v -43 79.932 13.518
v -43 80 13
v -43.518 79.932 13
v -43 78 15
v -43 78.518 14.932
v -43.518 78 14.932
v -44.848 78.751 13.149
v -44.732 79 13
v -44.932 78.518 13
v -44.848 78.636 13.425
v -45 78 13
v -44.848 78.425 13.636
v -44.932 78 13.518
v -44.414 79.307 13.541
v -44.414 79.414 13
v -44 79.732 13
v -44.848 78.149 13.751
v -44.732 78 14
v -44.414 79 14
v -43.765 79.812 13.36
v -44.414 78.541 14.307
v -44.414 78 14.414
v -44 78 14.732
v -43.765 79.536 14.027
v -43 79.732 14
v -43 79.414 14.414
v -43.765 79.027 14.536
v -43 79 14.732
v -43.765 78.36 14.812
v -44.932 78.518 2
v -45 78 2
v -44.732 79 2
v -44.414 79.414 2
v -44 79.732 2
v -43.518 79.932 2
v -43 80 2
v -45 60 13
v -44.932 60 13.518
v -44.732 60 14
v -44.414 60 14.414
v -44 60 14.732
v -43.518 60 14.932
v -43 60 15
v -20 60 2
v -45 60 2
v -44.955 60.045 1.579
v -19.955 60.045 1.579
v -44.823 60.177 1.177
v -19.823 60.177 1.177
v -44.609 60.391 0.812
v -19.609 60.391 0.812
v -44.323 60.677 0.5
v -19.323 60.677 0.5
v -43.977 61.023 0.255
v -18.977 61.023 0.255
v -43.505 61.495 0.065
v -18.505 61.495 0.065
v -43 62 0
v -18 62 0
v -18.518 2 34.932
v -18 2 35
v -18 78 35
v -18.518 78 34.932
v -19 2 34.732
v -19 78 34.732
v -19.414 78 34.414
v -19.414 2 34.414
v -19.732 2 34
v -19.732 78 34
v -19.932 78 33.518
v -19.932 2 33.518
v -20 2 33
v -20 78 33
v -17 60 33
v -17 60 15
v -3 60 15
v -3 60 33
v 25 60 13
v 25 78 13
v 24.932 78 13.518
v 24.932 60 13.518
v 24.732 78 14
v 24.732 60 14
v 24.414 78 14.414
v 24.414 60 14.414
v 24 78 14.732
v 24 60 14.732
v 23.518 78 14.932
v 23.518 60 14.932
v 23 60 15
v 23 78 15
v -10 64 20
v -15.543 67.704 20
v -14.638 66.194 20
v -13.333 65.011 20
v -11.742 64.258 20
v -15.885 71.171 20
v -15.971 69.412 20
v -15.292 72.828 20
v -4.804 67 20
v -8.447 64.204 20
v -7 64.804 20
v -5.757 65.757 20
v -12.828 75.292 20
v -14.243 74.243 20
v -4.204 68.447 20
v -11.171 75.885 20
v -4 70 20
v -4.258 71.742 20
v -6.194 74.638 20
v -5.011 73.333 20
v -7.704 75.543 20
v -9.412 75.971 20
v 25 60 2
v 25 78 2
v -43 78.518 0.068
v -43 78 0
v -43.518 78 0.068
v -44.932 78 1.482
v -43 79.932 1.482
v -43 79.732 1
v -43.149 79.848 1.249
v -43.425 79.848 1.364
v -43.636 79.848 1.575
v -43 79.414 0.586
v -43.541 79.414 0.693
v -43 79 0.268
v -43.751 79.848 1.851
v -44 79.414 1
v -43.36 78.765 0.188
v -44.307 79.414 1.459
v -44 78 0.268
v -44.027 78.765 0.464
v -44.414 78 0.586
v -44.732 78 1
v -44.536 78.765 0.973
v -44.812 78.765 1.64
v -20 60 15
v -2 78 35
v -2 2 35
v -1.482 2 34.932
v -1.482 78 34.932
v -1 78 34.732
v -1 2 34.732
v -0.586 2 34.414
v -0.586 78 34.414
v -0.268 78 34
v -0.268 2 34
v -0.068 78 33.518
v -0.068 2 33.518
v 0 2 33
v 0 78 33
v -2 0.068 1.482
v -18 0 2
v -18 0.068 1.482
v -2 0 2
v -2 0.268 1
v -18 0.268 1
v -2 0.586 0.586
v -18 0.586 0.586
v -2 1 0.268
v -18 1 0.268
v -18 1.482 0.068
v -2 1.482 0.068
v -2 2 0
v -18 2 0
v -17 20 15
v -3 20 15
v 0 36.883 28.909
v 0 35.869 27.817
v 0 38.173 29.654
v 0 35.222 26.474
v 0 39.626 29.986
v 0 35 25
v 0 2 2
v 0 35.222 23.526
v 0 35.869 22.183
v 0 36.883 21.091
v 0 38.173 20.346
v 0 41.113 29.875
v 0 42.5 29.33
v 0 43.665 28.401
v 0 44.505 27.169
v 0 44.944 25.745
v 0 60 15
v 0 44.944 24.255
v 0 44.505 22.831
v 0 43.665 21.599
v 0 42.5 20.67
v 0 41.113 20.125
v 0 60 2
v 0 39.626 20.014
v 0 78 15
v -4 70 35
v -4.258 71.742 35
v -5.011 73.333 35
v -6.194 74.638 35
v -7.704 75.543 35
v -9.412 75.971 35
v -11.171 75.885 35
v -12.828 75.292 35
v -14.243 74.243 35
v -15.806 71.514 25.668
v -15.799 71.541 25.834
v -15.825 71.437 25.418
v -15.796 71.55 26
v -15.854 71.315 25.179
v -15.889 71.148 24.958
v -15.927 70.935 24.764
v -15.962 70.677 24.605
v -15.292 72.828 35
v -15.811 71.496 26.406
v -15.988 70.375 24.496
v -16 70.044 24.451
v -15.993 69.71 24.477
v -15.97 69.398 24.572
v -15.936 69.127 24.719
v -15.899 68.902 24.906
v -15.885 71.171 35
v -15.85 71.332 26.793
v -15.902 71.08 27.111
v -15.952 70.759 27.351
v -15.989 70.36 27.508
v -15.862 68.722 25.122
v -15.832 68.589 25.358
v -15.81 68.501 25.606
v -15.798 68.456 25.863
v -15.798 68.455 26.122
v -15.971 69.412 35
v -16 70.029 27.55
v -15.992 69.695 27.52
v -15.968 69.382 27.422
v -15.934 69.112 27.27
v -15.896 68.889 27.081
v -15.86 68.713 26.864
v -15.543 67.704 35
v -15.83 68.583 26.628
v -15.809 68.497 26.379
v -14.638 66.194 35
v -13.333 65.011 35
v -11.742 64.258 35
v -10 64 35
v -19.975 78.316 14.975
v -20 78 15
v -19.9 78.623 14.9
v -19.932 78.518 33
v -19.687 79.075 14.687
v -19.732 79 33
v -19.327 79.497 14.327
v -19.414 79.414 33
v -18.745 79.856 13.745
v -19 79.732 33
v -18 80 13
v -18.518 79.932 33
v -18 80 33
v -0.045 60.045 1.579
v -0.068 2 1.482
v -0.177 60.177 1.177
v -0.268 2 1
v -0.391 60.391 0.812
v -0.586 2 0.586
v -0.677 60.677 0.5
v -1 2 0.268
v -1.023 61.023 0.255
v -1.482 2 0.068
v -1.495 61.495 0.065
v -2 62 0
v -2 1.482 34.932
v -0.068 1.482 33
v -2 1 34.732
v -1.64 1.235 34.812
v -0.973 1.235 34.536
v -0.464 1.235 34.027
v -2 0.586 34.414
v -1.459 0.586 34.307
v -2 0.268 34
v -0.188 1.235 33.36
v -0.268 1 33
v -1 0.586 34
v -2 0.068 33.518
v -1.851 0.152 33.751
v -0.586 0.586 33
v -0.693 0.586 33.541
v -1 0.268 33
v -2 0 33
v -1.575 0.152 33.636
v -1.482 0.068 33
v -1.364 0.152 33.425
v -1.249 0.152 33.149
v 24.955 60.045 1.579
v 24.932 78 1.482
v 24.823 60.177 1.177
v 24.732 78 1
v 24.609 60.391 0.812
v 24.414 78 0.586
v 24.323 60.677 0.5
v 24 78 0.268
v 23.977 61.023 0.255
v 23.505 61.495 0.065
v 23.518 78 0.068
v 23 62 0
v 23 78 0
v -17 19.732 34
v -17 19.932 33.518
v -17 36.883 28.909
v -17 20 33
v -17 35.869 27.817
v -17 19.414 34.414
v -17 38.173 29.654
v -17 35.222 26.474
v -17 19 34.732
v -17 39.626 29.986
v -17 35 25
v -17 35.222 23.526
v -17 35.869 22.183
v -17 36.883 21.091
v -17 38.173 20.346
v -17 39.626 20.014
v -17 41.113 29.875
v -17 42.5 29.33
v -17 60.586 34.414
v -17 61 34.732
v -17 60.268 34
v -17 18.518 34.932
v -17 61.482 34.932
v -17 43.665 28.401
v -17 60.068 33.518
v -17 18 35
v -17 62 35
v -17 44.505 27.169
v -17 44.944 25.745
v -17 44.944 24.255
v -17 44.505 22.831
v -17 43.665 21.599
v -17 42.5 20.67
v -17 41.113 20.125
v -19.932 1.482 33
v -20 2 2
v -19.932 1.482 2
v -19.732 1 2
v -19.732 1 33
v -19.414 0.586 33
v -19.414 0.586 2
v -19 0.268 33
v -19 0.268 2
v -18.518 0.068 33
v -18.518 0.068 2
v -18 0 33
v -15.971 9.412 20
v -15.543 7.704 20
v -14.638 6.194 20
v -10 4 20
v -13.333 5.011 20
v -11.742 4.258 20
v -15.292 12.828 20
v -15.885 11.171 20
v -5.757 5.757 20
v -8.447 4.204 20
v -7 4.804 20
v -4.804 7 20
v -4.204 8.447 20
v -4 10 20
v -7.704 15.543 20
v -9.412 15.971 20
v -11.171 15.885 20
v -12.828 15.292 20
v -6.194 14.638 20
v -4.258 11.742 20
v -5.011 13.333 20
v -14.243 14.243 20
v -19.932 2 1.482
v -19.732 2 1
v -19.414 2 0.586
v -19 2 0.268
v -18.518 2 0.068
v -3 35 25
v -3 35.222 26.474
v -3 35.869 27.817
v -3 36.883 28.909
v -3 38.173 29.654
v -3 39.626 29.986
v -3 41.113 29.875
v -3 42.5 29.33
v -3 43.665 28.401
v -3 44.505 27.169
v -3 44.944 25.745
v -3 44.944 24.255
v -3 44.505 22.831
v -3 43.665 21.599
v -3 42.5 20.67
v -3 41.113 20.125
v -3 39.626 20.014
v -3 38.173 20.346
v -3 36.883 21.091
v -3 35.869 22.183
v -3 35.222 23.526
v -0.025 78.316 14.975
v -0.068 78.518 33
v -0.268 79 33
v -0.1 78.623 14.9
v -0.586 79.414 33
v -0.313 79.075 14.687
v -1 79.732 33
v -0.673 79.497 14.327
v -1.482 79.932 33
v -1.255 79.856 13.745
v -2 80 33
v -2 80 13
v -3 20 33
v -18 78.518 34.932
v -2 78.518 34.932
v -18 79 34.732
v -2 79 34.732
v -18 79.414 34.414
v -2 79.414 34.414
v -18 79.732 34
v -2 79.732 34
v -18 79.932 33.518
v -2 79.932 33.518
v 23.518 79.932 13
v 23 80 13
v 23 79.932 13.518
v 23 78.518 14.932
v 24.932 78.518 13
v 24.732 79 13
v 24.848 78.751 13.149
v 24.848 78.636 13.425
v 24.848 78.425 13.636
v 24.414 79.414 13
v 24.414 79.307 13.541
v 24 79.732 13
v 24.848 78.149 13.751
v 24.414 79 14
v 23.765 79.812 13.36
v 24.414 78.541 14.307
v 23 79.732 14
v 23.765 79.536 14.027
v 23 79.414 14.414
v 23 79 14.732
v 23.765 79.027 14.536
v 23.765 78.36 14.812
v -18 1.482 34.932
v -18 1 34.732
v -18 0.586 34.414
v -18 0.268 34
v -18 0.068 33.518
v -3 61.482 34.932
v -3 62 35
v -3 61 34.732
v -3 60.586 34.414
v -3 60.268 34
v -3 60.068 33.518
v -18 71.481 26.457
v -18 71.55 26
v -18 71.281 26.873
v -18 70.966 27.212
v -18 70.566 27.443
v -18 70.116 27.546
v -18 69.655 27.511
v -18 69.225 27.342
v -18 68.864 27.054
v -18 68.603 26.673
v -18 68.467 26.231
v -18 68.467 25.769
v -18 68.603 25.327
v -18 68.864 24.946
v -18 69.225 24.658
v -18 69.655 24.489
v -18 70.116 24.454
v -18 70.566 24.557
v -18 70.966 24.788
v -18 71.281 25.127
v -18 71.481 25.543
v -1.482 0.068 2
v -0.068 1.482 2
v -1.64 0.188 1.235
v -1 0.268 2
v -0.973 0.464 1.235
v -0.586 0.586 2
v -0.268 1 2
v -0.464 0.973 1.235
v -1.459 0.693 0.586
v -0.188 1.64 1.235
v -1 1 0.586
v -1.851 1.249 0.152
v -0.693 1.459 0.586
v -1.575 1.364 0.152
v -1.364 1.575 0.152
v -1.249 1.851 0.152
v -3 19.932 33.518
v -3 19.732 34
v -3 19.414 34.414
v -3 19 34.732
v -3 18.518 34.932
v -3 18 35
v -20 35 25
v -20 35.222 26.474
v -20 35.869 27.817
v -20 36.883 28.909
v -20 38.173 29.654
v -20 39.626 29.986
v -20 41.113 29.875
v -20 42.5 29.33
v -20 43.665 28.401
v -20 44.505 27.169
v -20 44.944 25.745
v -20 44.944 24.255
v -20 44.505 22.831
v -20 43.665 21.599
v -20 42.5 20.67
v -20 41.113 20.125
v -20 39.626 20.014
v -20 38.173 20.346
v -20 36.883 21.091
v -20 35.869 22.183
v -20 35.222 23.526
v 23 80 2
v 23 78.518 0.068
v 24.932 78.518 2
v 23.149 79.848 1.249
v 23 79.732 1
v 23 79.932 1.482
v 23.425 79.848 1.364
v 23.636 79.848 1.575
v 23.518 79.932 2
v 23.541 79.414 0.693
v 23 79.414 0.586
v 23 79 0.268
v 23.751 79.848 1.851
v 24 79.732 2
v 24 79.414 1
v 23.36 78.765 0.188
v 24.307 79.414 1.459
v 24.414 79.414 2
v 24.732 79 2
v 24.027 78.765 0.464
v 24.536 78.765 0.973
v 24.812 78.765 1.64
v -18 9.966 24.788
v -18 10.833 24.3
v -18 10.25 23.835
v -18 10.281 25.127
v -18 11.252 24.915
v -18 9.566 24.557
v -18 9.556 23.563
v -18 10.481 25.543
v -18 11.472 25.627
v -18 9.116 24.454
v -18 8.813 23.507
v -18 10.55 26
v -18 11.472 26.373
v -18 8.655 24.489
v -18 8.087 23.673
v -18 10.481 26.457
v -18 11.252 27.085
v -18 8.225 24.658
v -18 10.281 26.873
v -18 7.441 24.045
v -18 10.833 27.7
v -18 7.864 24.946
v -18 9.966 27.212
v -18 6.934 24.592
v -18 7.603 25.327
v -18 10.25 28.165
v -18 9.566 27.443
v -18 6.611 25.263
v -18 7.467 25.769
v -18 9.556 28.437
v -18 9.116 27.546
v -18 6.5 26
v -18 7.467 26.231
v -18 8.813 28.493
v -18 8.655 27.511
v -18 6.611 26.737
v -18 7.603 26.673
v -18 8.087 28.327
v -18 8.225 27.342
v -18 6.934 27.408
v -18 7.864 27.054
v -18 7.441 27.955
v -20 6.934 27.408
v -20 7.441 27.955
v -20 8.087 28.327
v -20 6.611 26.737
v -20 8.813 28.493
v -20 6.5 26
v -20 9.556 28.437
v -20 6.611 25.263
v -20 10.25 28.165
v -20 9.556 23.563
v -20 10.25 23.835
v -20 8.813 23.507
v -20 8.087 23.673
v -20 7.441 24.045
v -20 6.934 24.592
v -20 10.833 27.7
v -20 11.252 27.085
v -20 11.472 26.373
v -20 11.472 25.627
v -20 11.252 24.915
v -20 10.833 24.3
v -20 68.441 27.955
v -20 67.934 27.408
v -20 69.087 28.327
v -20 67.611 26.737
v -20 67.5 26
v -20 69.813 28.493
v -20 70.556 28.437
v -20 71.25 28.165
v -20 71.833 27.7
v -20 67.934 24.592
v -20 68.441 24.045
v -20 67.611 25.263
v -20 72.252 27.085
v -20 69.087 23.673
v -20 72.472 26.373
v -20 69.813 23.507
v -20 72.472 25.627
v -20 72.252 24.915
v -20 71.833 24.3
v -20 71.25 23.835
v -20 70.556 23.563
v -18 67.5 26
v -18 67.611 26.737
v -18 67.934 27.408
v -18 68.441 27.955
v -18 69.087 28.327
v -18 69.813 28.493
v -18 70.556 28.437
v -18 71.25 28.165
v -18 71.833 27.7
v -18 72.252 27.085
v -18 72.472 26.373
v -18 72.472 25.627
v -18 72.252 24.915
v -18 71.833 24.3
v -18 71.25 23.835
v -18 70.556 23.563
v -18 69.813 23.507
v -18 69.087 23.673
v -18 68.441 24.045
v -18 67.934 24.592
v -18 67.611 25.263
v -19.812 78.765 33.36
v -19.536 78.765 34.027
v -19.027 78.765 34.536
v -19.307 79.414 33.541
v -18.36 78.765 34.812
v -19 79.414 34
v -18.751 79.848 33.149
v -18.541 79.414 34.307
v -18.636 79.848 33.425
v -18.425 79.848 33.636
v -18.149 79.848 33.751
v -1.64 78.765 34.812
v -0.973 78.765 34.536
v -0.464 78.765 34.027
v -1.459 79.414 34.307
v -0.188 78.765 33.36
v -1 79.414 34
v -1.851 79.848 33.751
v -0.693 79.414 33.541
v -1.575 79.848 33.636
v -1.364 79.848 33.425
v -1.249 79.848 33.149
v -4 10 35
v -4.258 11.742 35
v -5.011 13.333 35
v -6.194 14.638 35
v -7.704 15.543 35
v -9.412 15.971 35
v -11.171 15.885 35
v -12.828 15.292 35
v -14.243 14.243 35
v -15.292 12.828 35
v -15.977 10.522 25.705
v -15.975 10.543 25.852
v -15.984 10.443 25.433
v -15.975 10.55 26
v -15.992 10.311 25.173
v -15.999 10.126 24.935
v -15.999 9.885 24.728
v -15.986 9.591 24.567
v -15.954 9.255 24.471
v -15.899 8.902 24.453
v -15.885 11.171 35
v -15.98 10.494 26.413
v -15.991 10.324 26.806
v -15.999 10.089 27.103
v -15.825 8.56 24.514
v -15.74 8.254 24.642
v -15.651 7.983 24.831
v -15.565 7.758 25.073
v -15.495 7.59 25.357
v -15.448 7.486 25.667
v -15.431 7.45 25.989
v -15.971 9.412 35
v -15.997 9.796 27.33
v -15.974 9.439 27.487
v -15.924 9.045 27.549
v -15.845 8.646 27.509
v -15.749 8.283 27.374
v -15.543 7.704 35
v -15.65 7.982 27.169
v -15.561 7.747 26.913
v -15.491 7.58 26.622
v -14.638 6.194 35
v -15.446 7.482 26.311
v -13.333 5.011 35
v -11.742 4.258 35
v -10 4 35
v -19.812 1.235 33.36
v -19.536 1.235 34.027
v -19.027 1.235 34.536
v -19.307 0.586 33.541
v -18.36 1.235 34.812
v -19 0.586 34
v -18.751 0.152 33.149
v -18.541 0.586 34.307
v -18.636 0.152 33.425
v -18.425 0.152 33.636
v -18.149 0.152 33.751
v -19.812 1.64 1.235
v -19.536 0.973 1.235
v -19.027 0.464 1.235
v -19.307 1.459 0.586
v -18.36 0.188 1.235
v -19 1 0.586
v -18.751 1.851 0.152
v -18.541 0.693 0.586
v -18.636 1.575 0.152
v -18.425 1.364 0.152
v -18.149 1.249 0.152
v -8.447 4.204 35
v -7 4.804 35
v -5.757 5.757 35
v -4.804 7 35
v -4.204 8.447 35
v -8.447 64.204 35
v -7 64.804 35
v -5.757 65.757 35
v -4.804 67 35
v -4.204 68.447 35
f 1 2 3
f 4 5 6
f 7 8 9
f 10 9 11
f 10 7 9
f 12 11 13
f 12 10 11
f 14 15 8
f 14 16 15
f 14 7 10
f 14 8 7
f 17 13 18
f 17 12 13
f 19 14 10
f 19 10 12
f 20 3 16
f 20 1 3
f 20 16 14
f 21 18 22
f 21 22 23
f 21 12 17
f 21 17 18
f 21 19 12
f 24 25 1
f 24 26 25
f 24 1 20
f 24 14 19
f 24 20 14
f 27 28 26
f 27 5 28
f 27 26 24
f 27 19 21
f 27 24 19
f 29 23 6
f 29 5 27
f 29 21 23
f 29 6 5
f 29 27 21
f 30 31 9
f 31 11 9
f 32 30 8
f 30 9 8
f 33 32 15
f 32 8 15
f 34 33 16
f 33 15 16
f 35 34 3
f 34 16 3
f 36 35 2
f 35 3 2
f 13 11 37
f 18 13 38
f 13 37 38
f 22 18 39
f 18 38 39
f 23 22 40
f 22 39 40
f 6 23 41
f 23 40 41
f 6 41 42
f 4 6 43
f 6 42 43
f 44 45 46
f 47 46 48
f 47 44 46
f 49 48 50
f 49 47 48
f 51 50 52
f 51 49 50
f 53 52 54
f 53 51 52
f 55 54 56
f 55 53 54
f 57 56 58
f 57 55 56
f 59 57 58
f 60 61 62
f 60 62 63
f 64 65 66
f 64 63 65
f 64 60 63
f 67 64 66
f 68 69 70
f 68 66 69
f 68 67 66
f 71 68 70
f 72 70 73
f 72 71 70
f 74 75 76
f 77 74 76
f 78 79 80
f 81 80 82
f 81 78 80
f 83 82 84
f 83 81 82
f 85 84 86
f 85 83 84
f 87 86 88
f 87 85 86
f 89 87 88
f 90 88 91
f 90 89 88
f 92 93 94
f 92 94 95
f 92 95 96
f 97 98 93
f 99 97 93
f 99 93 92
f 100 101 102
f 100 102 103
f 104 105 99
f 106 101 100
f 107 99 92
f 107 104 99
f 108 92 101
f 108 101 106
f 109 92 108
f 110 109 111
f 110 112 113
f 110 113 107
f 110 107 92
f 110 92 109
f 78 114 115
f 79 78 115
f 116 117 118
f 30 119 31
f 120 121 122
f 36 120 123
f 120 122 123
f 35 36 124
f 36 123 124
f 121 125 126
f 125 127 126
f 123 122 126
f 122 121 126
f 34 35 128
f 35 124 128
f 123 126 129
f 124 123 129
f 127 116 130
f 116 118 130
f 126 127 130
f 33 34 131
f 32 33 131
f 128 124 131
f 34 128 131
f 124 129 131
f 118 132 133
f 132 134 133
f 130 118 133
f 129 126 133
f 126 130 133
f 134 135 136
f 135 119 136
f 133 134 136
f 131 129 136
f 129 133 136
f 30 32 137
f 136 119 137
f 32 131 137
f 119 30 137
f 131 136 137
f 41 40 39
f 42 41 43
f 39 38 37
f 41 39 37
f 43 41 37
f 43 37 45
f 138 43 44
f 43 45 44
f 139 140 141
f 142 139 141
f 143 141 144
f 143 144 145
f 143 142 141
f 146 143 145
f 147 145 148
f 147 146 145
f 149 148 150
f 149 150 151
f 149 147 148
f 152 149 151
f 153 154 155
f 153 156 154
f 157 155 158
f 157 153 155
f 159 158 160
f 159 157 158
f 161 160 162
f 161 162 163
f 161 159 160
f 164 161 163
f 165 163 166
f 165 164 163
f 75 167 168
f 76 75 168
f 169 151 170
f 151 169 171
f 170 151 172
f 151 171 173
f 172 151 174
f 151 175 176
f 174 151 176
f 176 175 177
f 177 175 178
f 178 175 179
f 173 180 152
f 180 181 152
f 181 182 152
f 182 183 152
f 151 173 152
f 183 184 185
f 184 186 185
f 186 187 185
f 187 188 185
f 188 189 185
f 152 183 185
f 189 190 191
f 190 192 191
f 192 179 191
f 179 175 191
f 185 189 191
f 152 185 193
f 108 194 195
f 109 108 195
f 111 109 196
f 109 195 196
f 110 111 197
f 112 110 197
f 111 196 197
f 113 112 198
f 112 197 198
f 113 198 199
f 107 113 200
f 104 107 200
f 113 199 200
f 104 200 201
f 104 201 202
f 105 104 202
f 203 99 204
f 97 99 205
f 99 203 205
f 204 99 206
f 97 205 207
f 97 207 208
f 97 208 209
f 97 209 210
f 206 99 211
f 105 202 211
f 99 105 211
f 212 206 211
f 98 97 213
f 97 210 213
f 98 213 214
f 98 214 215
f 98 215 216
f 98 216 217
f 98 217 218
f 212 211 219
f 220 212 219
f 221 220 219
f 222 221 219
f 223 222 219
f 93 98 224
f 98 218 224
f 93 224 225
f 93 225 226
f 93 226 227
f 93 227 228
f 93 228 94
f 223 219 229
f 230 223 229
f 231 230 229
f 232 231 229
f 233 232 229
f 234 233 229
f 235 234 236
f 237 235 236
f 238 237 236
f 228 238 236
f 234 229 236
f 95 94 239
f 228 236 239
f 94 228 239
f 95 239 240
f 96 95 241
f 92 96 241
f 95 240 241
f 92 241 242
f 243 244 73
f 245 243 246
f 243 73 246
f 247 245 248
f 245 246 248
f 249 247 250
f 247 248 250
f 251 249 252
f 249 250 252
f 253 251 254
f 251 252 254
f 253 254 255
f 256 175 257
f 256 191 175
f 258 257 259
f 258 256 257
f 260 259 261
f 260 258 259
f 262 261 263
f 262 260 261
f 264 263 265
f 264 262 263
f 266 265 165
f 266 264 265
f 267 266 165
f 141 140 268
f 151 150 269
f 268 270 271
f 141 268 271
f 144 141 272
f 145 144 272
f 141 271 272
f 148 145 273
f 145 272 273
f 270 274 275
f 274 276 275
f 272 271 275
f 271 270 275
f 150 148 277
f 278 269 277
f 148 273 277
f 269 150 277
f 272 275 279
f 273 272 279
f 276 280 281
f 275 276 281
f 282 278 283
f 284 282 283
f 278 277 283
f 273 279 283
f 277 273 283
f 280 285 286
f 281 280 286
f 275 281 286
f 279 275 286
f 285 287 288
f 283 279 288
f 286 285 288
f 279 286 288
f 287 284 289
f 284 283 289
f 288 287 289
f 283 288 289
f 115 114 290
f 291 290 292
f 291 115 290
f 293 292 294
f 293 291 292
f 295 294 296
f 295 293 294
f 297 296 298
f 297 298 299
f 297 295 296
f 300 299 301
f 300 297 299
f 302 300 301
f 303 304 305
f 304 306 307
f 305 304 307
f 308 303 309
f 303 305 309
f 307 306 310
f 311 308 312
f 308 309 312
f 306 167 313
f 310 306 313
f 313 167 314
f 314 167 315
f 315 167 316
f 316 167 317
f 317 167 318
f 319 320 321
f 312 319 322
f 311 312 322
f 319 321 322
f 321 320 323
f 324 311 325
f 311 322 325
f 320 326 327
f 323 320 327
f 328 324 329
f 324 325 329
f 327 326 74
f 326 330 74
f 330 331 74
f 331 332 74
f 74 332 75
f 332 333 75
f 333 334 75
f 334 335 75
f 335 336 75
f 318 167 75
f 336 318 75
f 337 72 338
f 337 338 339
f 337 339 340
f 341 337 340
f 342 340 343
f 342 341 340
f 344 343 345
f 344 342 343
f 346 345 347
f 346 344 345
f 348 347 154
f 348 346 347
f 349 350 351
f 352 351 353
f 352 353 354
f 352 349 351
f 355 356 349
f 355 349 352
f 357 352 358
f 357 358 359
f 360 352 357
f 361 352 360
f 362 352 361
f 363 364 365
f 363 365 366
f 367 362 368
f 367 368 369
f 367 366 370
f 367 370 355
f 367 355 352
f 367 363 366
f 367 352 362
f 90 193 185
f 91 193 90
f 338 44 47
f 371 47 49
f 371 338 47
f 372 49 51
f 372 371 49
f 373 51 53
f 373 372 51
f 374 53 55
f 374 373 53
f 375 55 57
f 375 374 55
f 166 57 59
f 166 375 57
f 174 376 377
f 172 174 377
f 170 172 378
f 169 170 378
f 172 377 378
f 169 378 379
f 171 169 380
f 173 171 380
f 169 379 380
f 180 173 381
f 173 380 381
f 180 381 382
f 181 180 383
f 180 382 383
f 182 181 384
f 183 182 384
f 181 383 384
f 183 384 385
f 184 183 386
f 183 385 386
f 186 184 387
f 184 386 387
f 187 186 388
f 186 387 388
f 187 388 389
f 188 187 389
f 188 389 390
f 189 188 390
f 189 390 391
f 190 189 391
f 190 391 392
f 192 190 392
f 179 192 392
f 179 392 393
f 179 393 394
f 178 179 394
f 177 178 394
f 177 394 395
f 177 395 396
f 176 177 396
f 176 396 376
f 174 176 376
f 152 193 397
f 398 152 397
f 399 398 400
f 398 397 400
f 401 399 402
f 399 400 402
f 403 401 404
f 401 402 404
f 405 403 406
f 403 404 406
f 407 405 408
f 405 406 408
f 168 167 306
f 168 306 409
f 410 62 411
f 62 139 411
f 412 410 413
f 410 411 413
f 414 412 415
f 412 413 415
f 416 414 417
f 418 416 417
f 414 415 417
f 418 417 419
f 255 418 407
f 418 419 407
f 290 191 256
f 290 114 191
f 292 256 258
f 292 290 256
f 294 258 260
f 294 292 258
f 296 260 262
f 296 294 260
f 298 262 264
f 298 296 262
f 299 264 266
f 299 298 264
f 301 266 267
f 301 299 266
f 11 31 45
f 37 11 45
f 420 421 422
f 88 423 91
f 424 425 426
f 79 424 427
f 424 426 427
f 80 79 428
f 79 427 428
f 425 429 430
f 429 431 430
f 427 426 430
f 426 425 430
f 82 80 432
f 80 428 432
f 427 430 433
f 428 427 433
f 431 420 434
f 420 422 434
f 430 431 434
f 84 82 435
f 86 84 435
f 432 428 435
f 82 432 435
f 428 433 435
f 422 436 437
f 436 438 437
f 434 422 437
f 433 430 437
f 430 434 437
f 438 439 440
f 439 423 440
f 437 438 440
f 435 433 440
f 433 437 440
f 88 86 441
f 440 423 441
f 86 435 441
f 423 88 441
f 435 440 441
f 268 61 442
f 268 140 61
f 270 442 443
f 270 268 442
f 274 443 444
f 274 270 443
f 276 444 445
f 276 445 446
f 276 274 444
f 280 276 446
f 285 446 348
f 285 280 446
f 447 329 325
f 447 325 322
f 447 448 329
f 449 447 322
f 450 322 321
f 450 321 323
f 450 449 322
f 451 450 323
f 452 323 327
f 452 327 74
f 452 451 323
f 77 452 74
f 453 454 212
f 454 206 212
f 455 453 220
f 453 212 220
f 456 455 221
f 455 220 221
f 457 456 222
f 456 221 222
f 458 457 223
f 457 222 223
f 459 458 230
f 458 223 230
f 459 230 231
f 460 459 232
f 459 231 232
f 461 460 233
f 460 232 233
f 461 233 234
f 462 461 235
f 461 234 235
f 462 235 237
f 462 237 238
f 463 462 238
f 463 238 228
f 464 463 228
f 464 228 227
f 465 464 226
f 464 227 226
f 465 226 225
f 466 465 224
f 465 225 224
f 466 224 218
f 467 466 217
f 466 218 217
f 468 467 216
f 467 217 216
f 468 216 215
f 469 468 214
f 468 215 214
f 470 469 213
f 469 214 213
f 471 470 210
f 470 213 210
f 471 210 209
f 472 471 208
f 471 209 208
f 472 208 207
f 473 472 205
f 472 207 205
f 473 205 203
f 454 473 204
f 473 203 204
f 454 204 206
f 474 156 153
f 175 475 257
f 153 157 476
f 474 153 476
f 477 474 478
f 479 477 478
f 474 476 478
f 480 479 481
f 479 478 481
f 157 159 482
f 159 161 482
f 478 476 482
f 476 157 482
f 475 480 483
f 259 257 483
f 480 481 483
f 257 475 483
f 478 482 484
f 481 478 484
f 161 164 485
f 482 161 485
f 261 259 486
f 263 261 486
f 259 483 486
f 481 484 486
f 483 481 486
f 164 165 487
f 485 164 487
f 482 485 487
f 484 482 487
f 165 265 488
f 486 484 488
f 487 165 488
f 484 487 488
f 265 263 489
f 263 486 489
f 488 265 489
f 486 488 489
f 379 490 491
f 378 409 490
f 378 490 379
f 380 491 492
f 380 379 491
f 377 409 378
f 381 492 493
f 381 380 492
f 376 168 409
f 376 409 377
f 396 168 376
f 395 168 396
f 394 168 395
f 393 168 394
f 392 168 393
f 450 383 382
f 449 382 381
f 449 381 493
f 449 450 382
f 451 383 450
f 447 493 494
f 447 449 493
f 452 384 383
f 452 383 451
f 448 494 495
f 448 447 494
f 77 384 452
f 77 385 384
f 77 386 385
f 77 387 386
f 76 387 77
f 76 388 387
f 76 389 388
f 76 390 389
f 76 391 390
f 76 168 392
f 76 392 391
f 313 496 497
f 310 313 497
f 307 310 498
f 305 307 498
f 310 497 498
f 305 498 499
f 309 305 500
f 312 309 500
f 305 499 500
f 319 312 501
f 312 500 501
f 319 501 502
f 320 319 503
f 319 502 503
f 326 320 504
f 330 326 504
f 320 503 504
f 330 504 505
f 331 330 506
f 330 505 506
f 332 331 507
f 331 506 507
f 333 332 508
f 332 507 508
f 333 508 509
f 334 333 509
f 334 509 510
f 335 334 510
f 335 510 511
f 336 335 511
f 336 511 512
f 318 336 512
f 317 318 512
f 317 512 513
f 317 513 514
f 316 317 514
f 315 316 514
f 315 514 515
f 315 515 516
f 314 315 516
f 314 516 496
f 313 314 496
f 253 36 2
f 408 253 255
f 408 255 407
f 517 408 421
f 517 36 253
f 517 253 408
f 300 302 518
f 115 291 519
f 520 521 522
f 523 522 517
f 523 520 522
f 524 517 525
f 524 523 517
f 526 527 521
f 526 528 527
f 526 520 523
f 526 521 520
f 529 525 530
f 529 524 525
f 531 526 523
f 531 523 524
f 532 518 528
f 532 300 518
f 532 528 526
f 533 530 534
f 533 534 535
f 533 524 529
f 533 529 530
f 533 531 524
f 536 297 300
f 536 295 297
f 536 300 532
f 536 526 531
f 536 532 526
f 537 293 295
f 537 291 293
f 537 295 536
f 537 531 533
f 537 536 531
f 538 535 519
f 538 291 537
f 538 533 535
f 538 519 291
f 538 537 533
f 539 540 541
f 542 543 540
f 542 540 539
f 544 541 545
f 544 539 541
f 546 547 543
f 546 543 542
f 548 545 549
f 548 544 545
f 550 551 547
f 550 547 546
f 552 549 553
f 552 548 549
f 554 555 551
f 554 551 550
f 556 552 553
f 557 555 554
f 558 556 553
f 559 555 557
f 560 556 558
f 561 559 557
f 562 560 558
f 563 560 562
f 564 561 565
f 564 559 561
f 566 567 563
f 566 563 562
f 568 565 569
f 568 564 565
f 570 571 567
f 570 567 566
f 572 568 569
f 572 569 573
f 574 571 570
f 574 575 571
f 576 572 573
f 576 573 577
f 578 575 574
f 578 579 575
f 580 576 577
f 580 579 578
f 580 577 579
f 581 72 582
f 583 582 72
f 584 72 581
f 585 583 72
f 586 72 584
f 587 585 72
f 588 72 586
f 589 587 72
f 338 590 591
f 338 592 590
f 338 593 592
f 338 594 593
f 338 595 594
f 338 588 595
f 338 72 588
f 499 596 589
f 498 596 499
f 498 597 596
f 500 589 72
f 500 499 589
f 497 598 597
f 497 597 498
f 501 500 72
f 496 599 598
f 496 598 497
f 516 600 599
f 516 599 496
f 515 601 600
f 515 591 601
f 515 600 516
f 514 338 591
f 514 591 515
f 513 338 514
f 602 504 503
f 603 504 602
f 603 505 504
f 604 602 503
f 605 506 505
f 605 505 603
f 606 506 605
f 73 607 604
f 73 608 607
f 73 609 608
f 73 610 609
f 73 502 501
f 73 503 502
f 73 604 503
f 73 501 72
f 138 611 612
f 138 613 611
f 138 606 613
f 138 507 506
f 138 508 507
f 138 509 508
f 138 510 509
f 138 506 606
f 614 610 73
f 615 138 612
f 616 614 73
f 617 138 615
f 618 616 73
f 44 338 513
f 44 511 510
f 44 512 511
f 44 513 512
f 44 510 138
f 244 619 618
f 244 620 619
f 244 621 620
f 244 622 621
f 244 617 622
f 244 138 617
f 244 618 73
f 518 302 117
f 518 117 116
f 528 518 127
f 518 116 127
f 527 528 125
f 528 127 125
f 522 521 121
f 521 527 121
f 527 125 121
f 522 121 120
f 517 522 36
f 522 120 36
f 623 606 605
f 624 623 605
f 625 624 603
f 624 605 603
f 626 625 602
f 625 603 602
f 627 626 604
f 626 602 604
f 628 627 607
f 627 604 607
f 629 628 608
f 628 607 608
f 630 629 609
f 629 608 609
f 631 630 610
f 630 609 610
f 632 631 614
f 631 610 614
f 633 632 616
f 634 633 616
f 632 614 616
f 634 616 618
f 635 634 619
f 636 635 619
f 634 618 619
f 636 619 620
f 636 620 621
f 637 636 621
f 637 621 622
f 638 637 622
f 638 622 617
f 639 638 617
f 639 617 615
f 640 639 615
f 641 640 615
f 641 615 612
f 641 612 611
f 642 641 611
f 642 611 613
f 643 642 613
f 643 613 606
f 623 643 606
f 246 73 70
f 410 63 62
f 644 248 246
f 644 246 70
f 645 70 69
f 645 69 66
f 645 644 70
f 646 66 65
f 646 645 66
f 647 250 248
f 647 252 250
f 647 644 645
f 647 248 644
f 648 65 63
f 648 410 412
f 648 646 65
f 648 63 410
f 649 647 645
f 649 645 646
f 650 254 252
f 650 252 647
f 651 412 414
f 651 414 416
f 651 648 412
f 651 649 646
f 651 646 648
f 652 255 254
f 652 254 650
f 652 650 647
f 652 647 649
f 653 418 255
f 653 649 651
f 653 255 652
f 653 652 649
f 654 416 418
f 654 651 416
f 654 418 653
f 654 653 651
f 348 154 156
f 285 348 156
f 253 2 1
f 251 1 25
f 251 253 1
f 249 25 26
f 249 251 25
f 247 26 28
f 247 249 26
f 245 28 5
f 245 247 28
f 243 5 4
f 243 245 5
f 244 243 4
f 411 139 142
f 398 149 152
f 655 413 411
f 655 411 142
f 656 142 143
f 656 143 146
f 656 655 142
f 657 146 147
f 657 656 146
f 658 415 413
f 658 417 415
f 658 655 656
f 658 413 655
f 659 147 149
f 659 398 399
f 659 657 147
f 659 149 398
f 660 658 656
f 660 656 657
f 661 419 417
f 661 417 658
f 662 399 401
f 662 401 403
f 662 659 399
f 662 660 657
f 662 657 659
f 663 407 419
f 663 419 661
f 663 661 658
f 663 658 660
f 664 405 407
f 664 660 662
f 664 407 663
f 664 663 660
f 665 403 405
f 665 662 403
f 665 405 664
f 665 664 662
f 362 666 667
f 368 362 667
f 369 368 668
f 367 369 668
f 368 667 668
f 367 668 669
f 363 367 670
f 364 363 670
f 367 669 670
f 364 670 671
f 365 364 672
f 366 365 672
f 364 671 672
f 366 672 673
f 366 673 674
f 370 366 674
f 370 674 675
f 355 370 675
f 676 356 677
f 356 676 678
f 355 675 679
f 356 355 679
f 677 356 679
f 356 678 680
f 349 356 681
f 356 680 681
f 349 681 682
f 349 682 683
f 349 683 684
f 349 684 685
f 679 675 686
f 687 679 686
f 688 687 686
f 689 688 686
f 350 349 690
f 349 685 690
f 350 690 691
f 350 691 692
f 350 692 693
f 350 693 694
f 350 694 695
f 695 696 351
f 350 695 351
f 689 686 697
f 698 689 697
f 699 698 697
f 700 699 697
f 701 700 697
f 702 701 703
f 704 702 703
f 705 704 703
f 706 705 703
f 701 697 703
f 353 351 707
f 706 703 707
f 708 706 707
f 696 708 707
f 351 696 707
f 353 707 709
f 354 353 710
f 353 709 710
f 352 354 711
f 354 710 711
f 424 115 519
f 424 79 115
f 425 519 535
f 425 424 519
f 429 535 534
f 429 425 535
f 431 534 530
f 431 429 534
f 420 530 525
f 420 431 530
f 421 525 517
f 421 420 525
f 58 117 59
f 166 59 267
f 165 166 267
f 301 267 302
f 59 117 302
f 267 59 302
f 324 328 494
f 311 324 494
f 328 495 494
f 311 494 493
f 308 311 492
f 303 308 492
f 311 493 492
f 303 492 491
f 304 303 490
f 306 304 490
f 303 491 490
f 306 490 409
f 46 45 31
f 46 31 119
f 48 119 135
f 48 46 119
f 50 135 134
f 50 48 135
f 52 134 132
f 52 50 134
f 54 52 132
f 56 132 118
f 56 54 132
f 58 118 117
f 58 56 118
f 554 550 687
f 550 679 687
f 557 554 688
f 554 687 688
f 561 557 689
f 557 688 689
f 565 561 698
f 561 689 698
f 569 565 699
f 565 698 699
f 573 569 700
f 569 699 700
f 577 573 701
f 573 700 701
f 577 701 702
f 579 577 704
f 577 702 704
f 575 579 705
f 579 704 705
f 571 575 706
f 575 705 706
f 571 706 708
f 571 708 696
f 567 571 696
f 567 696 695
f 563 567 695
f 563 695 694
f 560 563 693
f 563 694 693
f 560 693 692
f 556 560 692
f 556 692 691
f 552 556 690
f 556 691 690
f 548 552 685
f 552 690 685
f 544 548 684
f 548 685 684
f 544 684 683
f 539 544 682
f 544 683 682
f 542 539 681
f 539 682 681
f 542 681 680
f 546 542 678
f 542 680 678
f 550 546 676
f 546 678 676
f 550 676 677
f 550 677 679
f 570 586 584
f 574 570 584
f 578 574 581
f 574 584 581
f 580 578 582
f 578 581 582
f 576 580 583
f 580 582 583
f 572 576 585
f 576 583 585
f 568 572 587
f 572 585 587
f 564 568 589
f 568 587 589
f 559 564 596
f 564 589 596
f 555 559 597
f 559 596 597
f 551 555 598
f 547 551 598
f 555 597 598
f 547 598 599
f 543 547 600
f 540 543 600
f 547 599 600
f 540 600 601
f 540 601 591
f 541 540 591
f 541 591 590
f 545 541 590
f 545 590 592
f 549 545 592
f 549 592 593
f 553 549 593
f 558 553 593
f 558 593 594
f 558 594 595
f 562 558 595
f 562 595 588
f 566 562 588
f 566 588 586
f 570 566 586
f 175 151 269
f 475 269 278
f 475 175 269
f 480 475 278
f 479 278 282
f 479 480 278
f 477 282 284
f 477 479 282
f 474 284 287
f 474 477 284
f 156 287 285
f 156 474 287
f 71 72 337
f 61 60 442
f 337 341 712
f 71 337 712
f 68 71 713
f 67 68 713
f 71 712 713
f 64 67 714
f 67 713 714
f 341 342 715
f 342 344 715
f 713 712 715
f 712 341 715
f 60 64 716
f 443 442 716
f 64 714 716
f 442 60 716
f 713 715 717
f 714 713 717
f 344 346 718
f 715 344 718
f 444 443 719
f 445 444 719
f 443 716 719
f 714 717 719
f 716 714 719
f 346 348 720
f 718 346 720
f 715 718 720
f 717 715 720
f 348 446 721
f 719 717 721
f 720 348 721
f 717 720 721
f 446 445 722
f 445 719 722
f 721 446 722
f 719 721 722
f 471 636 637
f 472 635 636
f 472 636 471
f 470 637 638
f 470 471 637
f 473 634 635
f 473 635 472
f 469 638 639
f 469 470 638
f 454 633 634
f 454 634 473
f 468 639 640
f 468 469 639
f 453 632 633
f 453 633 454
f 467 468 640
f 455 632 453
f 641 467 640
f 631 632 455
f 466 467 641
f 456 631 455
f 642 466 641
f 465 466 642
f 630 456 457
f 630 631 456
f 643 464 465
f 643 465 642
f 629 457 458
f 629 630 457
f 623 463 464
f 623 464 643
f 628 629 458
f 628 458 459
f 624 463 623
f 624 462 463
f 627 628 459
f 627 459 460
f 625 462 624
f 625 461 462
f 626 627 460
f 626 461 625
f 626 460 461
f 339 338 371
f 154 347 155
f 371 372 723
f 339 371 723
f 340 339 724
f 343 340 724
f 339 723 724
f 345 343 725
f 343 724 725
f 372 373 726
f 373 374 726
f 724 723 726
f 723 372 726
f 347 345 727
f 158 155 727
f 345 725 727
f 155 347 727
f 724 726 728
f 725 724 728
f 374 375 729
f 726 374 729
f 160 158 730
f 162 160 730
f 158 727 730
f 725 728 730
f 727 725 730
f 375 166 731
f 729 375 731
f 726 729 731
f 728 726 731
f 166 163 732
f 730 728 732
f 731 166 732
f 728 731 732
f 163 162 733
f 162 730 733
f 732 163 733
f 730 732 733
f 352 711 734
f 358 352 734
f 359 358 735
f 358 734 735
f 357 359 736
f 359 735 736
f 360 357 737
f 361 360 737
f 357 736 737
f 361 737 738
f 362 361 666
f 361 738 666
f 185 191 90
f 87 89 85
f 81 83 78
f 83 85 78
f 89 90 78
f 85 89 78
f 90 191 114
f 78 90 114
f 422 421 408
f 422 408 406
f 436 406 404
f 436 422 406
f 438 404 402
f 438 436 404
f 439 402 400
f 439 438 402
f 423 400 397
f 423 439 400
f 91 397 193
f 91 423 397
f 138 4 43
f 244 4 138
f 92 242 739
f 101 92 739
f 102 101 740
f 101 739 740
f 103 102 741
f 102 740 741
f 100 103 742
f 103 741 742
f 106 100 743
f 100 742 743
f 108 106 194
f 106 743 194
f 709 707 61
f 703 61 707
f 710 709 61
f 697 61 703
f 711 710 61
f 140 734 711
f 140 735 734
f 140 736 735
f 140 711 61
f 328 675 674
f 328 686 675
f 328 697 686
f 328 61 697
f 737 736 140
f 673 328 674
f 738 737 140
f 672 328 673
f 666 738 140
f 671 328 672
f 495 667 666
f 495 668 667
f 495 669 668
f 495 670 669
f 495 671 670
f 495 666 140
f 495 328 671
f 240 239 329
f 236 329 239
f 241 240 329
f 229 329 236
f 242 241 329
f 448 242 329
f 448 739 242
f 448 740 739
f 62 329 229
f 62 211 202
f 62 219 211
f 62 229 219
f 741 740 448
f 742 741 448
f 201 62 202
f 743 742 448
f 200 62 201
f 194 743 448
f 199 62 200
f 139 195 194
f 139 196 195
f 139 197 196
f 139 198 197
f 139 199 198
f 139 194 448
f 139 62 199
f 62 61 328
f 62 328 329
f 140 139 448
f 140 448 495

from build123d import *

# Parameters (mm, degrees)
F1_DEPTH        = 15
F2_W            = 20
F2_H            = 20
F3_DEPTH        = 20
F5_DEPTH        = 15
F6_W            = 20
F6_H            = 20
F7_DEPTH        = 20
F9_DEPTH        = 15
F10_W           = 3
F10_H           = 40
F11_DEPTH       = 20
F12_R           = 5
F13_DEPTH       = 25
F14_R           = 2
F15_R           = 2
F16_R           = 2
F17_R           = 2
F19_D           = 3.1
F19_DEPTH       = 6
F19_CBORE_D     = 5
F19_CBORE_DEPTH = 2


with BuildPart() as f1:
    # F0 (on Top) → F1 (new body)
    with BuildSketch(Plane.XY):
        Polygon((-20, 0), (0, 0), (0, 60), (25, 60), (25, 80), (-45, 80), (-45, 60), (-20, 60), align=None)
    extrude(amount=F1_DEPTH)

    # F2 (on face) → F3 (join)
    with BuildSketch(Plane.XY.offset(15)):
        with Locations((-10, 10)):
            Rectangle(F2_W, F2_H)
    extrude(amount=F3_DEPTH)

    # F4 (on face) → F5 (cut)
    with BuildSketch(Plane.XY.offset(35)):
        with BuildLine():
            ThreePointArc((-10, 4), (-5.757359, 5.757359), (-4, 10))
            ThreePointArc((-4, 10), (-14.242641, 14.242641), (-10, 4))
        make_face()
    extrude(amount=-F5_DEPTH, mode=Mode.SUBTRACT)

    # F6 (on face) → F7 (join)
    with BuildSketch(Plane.XY.offset(15)):
        with Locations((-10, 70)):
            Rectangle(F6_W, F6_H)
    extrude(amount=F7_DEPTH)

    # F8 (on face) → F9 (cut)
    with BuildSketch(Plane.XY.offset(35)):
        with BuildLine():
            ThreePointArc((-10, 64), (-5.757359, 65.757359), (-4, 70))
            ThreePointArc((-4, 70), (-14.242641, 74.242641), (-10, 64))
        make_face()
    extrude(amount=-F9_DEPTH, mode=Mode.SUBTRACT)

    # F10 (on face) → F11 (join)
    with BuildSketch(Plane.XY.offset(15)):
        with Locations((-1.5, 40)):
            Rectangle(F10_W, F10_H)
        with Locations((-18.5, 40)):
            Rectangle(F10_W, F10_H)
    extrude(amount=F11_DEPTH)

    # F12 (on face) → F13 (cut)
    with BuildSketch(Plane(origin=(-20, 0, 0), x_dir=(0, -1, 0), z_dir=(-1, 0, 0))):
        with Locations((-40, 25)):
            Circle(F12_R)
    extrude(amount=-F13_DEPTH, mode=Mode.SUBTRACT)

    # F14
    f14_edges = [f1.edges().sort_by_distance(p)[0] for p in [
        (-20, 40, 35),
        (0, 40, 35),
    ]]
    fillet(f14_edges, radius=F14_R)

    # F15
    f15_edges = [f1.edges().sort_by_distance(p)[0] for p in [
        (-10, 20, 35),
        (-10, 60, 35),
        (-10, 80, 35),
        (-10, 0, 35),
    ]]
    fillet(f15_edges, radius=F15_R)

    # F16
    f16_edges = [f1.edges().sort_by_distance(p)[0] for p in [
        (-1, 80, 15),
        (12.5, 80, 15),
        (-19, 80, 15),
        (-32.5, 80, 15),
    ]]
    fillet(f16_edges, radius=F16_R)

    # F17
    f17_edges = [f1.edges().sort_by_distance(p)[0] for p in [
        (-20, 31, 0),
        (-32.5, 60, 0),
        (12.5, 60, 0),
        (-45, 70, 0),
        (25, 70, 0),
        (-10, 80, 0),
        (-45, 80, 6.5),
        (25, 80, 6.5),
    ]]
    fillet(f17_edges, radius=F17_R)

    # F19
    with Locations(Plane(origin=(-20, 0, 0), x_dir=(0, -1, 0), z_dir=(-1, 0, 0))):
        with Locations((-70, 26), (-9, 26)):
            CounterBoreHole(F19_D / 2, F19_CBORE_D / 2, F19_CBORE_DEPTH, depth=F19_DEPTH)


solid = f1.part
